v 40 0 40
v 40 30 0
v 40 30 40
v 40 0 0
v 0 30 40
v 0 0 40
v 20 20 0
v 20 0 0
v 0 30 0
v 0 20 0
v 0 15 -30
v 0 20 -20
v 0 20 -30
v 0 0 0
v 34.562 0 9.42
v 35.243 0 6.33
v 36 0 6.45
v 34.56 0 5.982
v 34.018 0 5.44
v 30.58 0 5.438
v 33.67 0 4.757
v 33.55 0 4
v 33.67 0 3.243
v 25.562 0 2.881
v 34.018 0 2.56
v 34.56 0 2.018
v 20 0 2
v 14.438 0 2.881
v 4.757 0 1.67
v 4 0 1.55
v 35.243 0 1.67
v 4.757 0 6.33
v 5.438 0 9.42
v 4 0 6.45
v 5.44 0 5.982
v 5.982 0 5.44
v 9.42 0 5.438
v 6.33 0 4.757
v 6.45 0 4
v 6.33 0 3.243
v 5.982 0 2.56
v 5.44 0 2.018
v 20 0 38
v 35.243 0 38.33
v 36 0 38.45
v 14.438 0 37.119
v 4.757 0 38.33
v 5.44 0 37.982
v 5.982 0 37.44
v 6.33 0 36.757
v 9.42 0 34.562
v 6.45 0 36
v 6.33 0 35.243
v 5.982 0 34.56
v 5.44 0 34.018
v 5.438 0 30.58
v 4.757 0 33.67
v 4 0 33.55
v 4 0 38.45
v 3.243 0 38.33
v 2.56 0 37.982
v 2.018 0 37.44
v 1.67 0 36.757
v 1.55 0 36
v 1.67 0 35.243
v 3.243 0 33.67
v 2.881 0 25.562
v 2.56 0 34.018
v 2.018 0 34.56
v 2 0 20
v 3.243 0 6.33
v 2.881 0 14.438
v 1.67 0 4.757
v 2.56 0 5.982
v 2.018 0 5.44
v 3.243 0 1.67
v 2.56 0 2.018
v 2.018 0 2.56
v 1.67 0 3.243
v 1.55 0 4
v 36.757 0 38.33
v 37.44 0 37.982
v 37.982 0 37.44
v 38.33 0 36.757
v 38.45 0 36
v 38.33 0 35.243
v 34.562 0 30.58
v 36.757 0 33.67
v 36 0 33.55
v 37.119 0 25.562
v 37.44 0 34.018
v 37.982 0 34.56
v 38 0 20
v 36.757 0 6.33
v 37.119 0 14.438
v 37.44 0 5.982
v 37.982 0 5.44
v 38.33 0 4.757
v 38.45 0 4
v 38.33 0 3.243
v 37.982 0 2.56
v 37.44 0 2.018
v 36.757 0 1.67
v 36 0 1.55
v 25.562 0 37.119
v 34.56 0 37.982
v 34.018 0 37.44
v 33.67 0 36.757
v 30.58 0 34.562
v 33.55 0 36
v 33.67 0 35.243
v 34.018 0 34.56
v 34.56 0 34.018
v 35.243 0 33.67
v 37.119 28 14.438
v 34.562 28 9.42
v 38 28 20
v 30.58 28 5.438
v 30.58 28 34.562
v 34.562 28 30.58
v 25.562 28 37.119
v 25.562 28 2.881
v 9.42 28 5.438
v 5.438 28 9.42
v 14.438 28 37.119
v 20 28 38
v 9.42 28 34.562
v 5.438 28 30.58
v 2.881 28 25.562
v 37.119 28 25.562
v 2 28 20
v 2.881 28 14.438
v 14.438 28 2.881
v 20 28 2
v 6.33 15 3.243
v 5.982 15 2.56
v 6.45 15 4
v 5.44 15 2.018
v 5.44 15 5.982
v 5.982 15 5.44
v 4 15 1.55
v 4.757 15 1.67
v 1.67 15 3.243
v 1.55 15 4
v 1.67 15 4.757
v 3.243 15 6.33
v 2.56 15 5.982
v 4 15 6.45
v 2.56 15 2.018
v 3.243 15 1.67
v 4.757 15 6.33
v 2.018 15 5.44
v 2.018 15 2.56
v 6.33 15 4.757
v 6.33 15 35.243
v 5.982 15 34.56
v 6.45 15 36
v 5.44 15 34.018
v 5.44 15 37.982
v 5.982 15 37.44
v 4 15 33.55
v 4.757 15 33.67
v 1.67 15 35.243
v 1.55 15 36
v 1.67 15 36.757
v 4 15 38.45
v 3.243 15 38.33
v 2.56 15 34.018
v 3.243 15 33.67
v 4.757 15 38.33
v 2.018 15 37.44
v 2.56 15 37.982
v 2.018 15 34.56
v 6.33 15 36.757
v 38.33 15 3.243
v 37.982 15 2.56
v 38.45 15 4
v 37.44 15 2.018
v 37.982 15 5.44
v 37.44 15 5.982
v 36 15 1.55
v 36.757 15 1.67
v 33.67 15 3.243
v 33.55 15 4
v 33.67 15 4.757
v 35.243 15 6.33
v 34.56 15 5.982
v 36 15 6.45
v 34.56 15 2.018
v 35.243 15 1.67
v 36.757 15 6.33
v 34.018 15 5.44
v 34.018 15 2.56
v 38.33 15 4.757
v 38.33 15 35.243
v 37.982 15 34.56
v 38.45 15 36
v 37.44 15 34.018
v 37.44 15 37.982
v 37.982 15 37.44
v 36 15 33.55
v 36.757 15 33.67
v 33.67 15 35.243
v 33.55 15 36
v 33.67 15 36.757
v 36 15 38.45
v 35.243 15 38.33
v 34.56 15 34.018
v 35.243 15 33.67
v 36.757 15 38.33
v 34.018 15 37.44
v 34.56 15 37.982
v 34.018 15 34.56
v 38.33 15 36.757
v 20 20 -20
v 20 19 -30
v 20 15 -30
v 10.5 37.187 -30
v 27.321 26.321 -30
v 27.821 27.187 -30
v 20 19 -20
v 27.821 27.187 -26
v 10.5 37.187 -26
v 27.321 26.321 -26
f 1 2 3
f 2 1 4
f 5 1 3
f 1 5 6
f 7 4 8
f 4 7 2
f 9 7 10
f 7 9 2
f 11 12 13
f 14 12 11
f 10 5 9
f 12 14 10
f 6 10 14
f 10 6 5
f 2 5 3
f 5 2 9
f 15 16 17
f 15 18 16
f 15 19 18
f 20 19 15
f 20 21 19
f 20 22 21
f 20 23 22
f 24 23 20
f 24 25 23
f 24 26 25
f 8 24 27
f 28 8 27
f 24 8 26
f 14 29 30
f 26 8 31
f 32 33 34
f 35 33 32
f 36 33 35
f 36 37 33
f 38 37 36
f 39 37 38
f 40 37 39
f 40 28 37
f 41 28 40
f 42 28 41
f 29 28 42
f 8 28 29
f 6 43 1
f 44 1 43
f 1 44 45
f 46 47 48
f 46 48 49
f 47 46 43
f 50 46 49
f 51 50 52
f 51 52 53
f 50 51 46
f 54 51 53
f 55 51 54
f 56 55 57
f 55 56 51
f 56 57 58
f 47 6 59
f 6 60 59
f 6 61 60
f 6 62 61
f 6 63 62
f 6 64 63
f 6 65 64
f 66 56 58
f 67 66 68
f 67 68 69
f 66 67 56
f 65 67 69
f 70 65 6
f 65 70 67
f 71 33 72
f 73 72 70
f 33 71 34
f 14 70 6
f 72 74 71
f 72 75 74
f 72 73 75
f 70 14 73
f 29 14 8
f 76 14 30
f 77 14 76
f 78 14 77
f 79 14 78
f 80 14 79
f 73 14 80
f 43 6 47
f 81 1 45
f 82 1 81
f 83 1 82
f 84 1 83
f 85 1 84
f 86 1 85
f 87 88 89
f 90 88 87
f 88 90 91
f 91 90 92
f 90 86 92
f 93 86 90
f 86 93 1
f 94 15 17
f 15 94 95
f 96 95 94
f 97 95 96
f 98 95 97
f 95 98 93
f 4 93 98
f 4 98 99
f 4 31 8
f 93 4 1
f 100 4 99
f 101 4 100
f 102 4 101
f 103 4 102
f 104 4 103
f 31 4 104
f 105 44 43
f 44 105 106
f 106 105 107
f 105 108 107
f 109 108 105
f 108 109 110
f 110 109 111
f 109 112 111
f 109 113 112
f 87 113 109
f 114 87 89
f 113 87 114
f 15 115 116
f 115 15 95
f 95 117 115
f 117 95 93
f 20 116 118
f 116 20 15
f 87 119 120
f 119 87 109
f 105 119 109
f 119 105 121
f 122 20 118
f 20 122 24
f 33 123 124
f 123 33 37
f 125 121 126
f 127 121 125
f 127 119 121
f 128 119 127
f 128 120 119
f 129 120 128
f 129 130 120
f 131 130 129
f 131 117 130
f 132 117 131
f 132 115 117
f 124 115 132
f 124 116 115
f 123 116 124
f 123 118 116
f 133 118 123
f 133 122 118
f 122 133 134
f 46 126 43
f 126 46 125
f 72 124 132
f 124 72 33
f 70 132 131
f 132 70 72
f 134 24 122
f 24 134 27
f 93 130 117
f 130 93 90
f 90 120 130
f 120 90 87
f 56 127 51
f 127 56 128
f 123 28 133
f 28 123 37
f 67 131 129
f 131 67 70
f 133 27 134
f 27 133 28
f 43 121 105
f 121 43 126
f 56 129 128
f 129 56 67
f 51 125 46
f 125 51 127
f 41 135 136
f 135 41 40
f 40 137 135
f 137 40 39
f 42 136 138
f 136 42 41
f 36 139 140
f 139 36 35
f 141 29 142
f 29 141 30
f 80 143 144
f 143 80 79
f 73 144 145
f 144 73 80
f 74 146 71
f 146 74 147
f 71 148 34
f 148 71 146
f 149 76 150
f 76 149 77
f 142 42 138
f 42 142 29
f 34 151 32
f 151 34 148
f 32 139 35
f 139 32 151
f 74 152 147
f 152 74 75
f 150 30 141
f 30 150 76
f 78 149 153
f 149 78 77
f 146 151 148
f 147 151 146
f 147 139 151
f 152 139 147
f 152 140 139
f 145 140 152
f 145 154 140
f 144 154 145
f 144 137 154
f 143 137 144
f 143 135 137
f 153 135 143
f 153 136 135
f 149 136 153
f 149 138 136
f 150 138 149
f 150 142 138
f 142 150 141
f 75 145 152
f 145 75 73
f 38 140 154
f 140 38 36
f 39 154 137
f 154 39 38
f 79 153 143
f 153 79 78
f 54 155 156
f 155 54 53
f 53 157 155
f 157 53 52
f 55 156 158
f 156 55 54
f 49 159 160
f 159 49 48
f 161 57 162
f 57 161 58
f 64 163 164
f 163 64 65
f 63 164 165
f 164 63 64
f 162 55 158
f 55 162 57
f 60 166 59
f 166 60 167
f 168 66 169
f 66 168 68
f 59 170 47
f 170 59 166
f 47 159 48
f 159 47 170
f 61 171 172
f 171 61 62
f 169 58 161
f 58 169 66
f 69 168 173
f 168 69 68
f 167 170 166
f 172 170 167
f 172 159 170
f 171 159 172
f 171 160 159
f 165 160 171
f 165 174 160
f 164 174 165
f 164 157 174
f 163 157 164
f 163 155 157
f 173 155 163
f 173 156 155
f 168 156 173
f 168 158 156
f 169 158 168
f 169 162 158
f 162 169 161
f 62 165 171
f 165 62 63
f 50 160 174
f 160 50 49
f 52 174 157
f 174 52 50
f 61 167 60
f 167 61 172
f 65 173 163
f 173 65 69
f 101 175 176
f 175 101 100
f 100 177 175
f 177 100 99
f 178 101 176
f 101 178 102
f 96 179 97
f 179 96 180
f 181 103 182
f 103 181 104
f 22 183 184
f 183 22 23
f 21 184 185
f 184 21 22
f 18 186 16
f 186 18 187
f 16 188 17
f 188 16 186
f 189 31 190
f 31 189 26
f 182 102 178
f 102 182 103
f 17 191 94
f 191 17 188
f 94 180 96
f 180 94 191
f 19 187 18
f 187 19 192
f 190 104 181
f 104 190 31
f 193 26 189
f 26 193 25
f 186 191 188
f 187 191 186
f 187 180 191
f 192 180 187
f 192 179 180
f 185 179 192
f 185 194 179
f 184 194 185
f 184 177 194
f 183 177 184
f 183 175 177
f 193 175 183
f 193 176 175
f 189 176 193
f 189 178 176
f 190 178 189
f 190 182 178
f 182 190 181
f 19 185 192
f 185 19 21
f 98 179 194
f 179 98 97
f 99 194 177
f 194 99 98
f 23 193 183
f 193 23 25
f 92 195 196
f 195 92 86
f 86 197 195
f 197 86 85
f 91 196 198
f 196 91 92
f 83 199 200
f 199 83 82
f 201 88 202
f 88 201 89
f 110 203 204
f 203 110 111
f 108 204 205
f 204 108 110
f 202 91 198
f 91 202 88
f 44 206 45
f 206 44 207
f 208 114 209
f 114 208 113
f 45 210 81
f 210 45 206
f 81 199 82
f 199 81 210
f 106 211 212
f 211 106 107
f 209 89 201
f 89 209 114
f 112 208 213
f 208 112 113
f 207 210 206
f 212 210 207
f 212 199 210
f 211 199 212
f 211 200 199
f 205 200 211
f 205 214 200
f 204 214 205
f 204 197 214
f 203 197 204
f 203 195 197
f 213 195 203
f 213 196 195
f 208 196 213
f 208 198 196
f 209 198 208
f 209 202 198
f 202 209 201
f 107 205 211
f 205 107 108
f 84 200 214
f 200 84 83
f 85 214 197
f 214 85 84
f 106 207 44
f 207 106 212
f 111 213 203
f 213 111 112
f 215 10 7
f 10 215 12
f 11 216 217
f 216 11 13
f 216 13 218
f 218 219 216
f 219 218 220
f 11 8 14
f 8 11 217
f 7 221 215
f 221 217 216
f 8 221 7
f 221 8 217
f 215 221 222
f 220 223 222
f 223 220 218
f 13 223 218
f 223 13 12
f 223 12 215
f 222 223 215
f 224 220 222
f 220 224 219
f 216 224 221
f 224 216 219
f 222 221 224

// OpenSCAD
eps = 0.3;
$fn = 20;

w = 40;
d = 30;
shd = 32; // screw hole distance
shr = (4+0.3)/2+eps; //screw hole radius

s = 2;

if(true){
difference(){
cube([w,d,w]);
    translate([w/2,0,w/2])rotate([-90,0,0])cylinder(d-s,w/2-s,w/2-s);
    do = (w-shd)/2;
    translate([do,0,do]) rotate([-90,0,0]) cylinder(d/2,shr,shr);
    translate([do,0,w-do]) rotate([-90,0,0]) cylinder(d/2,shr,shr);
    translate([w-do,0,do]) rotate([-90,0,0]) cylinder(d/2,shr,shr);
    translate([w-do,0,w-do]) rotate([-90,0,0]) cylinder(d/2,shr,shr);
}    
}

tz = 30;
tx = 10;

hull() {
linear_extrude(1)polygon([[0,0],[w/2,0],[w/2,w/2],[0,w/2]]);

translate([0,w/2-5,-30]) linear_extrude(1)polygon([[0,0],[w/2,0],[w/2,5],[0,5]]);
}

hull() {
translate([0,w/2-1,-30]) cube([w/2,1,10]);
translate([0,w/2-1,-30]) rotate([0,0,-tz]) translate([0,20,0]) cube([w/2,1,4]);
}
